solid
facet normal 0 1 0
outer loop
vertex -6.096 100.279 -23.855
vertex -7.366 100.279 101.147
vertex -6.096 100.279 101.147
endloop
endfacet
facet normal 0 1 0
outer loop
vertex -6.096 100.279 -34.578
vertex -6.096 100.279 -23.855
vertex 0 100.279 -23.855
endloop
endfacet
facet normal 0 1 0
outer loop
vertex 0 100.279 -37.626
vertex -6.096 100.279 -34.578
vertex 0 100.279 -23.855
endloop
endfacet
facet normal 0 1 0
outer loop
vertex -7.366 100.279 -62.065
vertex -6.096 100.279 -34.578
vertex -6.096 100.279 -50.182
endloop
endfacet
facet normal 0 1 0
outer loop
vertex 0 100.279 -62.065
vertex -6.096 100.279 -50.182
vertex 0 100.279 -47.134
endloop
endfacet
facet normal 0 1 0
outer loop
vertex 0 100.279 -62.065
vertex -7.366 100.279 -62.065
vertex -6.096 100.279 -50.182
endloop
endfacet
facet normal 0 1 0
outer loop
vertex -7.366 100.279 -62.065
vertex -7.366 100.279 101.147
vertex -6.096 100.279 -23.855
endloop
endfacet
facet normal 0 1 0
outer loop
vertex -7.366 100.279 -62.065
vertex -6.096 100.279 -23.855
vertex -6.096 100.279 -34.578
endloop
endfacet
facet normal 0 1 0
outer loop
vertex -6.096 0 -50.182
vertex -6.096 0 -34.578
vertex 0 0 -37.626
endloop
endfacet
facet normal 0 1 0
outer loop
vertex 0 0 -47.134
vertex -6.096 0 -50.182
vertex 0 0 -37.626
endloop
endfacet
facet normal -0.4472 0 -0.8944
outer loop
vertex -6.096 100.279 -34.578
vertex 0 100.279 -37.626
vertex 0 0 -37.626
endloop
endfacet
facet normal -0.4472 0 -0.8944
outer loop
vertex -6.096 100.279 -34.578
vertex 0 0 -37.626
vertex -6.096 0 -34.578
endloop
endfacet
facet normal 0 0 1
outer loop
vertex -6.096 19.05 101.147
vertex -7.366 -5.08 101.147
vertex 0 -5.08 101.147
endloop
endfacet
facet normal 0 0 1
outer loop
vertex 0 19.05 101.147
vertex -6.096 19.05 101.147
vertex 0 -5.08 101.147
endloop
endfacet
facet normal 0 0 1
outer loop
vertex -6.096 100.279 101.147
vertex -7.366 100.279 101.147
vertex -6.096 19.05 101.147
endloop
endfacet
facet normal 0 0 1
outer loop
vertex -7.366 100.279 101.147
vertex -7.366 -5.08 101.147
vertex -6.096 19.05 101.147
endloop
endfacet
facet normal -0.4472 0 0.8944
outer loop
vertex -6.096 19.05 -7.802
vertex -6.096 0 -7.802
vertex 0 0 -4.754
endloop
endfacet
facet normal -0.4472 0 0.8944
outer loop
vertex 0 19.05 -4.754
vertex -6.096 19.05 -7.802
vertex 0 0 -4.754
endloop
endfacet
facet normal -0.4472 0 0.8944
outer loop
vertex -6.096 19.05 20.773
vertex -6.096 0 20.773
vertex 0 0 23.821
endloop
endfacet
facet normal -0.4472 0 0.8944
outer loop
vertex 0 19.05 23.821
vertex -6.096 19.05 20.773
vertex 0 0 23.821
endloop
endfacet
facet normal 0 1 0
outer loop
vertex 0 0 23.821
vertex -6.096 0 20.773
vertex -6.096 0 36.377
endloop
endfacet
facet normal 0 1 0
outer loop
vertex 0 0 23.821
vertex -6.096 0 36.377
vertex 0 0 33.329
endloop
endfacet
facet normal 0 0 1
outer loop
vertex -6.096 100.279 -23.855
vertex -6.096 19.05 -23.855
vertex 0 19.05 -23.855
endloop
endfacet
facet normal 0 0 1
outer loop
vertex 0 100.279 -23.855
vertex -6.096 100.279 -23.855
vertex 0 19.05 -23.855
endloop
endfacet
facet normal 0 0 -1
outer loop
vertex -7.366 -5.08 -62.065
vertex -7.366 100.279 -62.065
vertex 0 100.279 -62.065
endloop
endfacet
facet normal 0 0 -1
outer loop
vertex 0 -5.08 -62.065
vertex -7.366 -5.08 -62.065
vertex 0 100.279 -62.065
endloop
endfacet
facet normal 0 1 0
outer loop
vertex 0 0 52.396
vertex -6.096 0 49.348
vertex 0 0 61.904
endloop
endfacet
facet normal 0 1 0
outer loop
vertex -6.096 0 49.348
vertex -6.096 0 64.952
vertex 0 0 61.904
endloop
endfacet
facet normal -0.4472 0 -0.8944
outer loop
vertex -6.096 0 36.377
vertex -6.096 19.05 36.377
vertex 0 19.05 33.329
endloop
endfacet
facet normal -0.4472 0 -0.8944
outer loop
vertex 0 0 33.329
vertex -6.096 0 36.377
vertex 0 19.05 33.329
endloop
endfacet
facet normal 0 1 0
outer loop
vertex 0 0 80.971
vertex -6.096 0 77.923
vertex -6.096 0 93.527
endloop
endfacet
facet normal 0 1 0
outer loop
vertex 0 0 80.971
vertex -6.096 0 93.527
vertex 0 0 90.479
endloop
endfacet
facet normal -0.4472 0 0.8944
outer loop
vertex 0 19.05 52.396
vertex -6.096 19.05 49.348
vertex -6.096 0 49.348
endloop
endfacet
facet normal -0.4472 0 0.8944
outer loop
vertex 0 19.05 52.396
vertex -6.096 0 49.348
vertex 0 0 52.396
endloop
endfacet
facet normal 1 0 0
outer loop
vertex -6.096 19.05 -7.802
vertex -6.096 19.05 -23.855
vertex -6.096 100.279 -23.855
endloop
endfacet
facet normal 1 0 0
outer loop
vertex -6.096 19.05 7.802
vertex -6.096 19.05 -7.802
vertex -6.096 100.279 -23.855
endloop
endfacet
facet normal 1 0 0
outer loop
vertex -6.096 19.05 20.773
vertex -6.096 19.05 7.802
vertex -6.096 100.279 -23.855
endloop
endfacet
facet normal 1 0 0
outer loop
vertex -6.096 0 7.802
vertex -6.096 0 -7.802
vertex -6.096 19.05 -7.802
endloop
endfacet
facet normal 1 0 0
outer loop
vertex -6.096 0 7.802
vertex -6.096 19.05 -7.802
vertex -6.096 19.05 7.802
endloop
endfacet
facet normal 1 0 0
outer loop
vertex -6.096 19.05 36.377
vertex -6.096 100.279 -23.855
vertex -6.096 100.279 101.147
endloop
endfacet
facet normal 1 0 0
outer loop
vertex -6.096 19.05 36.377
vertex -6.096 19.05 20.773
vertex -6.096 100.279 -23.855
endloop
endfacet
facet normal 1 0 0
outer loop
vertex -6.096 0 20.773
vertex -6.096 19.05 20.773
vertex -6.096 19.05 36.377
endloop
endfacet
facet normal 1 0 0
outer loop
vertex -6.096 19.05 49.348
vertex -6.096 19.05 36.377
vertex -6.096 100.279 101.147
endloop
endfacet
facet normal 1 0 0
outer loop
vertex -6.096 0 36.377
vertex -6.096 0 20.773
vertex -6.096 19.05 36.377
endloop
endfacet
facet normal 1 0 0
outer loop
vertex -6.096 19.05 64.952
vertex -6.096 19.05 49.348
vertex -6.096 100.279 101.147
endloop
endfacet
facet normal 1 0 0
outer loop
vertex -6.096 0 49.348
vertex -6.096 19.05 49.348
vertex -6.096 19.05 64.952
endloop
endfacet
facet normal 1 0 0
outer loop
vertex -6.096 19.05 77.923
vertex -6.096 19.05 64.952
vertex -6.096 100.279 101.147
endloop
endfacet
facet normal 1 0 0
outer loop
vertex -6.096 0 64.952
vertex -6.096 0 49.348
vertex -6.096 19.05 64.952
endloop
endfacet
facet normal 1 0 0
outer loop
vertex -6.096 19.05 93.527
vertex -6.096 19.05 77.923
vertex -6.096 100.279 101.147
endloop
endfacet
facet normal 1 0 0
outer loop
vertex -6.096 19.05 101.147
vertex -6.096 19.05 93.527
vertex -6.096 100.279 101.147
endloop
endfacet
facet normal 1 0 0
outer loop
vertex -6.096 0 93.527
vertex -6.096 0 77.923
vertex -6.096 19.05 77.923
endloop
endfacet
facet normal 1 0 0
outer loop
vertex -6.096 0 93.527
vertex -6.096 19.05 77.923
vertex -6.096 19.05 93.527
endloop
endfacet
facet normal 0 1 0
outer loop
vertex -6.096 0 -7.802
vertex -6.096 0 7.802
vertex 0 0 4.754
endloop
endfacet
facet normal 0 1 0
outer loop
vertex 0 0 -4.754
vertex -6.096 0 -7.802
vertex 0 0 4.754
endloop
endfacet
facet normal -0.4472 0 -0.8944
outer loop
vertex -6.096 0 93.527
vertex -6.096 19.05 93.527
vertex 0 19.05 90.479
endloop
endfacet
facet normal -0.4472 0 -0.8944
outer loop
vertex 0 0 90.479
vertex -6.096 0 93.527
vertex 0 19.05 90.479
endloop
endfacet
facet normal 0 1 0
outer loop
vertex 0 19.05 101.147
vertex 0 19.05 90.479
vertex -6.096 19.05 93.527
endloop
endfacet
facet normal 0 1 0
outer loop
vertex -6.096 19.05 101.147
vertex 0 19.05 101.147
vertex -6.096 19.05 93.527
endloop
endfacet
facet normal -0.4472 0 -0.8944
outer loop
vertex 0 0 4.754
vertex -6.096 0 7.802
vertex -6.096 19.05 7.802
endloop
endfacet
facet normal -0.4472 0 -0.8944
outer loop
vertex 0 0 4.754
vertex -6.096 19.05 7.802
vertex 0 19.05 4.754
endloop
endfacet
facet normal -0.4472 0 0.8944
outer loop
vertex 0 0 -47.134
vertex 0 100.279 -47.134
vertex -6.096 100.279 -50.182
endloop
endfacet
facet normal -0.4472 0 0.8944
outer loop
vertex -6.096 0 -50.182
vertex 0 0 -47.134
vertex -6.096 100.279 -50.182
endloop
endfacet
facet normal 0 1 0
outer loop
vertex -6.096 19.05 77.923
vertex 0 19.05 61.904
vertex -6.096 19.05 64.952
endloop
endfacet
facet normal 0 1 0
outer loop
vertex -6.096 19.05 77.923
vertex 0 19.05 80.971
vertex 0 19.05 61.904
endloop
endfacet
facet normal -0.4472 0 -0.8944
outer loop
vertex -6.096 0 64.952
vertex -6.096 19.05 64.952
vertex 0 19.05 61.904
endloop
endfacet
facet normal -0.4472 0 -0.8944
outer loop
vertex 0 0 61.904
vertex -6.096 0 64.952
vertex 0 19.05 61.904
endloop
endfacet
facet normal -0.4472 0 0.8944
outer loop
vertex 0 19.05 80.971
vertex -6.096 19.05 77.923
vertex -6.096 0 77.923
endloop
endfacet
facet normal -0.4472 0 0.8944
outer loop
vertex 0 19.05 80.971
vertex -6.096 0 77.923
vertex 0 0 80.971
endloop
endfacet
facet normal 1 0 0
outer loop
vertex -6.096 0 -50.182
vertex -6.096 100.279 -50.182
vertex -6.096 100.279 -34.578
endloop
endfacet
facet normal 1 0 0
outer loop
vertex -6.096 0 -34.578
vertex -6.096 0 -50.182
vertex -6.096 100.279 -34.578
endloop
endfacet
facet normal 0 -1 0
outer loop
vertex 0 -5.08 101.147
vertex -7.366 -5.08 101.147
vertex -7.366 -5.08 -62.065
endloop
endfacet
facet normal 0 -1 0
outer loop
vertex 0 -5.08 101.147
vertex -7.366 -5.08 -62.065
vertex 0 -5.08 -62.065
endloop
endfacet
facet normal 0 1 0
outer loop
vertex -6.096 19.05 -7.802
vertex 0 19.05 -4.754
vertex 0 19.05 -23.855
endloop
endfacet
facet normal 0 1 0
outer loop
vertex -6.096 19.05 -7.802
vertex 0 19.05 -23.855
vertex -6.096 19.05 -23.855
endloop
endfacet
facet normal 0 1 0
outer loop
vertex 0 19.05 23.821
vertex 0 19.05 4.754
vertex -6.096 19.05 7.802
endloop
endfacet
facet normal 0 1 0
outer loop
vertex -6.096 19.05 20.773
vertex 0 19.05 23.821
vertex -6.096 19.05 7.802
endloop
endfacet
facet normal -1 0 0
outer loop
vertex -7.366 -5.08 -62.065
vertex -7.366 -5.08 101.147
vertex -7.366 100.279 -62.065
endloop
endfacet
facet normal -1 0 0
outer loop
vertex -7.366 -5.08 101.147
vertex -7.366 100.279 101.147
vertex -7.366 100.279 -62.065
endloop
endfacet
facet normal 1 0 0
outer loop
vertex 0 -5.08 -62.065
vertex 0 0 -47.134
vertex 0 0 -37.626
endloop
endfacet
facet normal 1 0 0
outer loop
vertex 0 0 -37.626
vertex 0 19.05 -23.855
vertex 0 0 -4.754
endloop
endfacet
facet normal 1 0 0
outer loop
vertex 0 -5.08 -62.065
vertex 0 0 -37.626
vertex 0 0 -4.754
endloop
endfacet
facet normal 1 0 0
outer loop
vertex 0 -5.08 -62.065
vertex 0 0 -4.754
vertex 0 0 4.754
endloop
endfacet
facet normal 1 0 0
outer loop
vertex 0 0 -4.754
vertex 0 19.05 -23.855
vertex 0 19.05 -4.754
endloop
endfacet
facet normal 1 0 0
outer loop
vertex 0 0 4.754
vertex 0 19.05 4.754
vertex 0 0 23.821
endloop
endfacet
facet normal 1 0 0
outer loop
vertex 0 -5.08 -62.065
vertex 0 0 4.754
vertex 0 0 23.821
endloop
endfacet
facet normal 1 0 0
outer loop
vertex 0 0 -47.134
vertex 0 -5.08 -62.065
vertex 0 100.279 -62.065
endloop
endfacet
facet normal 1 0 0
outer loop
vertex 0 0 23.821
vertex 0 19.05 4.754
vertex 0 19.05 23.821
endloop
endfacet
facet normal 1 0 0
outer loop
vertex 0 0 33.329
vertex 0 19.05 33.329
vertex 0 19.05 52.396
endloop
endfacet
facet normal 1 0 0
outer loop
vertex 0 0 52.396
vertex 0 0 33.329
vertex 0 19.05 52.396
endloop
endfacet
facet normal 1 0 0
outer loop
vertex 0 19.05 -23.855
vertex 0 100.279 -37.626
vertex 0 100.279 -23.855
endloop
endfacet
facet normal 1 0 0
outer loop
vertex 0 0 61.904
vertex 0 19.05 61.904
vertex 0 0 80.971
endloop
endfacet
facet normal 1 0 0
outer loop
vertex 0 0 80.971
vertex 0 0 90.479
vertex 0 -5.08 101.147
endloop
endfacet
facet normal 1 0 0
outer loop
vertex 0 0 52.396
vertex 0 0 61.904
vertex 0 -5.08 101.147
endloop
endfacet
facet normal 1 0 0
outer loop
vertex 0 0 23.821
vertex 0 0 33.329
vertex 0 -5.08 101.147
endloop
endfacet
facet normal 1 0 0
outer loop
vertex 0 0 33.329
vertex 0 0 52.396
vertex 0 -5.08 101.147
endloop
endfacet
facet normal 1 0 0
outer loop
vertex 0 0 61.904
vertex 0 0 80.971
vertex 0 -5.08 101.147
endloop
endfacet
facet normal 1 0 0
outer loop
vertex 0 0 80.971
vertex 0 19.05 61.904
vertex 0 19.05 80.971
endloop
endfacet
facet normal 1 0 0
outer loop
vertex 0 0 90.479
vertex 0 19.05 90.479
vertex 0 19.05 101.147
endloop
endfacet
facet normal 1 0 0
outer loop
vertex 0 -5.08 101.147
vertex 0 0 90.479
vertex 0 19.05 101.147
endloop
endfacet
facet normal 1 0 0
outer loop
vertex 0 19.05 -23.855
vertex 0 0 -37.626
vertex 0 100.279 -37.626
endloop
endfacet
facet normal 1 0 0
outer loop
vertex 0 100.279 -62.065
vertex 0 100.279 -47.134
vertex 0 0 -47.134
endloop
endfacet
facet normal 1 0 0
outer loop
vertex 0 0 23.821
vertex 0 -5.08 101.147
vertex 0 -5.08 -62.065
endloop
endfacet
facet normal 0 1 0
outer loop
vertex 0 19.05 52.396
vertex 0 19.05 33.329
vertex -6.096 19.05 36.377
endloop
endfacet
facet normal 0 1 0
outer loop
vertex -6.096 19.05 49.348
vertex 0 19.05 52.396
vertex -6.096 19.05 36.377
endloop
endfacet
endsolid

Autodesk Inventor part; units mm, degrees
ref_plane "YZ Plane" through (0, 0, 0) normal (1, 0, 0) x (0, 1, 0)
ref_plane "XZ Plane" through (0, 0, 0) normal (0, 1, 0) x (-1, 0, 0)
ref_plane "XY Plane" through (0, 0, 0) normal (0, 0, 1) x (1, 0, 0)
sketch "Sketch1" plane through (0, 0, 0) normal (0, 1, 0) x (-1, 0, 0)
  line L0 (7.366, 0.1452) -> (7.366, -23.8548)
  line L1 (7.366, -23.8548) -> (0, -23.8548)
  line L2 (6.096, 4.754) -> (6.096, -4.754)
  line L3 (0, 4.754) -> (0, 7.802)
  line L4 (6.096, 7.802) -> (6.096, 4.754)
  line L5 (0, -4.754) -> (0, -7.548)
  line L6 (6.096, -7.802) -> (6.096, -4.754)
  line L7 (6.096, 7.802) -> (0, 4.754)
  line L8 (6.096, -7.802) -> (0, -4.754)
  line L9 (0, -23.8548) -> (0, -4.754)
  line L10 (0, 4.754) -> (0, 23.821)
  line L11 (6.096, 20.773) -> (6.096, 23.821)
  line L12 (6.096, 20.773) -> (0, 23.821)
  line L13 (6.096, 36.377) -> (6.096, 33.329)
  line L14 (6.096, 36.377) -> (0, 33.329)
  line L15 (6.096, 33.329) -> (6.096, 23.821)
  line L16 (6.096, 49.348) -> (6.096, 52.396)
  line L17 (6.096, 49.348) -> (0, 52.396)
  line L18 (6.096, 64.952) -> (6.096, 61.904)
  line L19 (6.096, 64.952) -> (0, 61.904)
  line L20 (6.096, 61.904) -> (6.096, 52.396)
  line L21 (6.096, 77.923) -> (6.096, 80.971)
  line L22 (6.096, 77.923) -> (0, 80.971)
  line L23 (6.096, 93.527) -> (6.096, 90.479)
  line L24 (6.096, 93.527) -> (0, 90.479)
  line L25 (6.096, 90.479) -> (6.096, 80.971)
  line L26 (7.366, 0.1452) -> (7.366, 101.147)
  line L27 (7.366, 101.147) -> (0, 101.147)
  line L28 (0, 33.329) -> (0, 52.396)
  line L29 (0, 61.904) -> (0, 80.971)
  line L30 (0, 90.479) -> (0, 101.147)
  point P0 (0, 0)
  dimension "d0" = 7.366
  dimension "d1" = 24
  dimension "d8" = 9.508
  dimension "d9" = 4.754
  dimension "d10" = 3.048
  dimension "d11" = 3.048
  dimension "d12" = 6.096
  dimension "d17" = 28.575
  dimension "d23" = 7.62
  dimension "d24" = 16.0528
  dimension "d31" = 125.0018
extrude "MultipleTeeth" add sketch "Sketch1" along normal blind 19.05
sketch "Sketch2" plane through (0, 0, 0) normal (0, -1, 0) x (1, 0, 0)
  line L0 (0, 4.754) -> (-6.096, 7.802) construction
  line L1 (-6.096, 7.802) -> (-6.096, -7.802) construction
  line L2 (-6.096, -7.802) -> (0, -4.754) construction
  line L3 (0, 23.821) -> (0, 4.754) projected
  line L4 (0, 4.754) -> (-6.096, 7.802)
  line L5 (-6.096, -7.802) -> (0, -4.754) projected
  line L6 (-6.096, 7.802) -> (-6.096, -7.802) projected
  line L7 (-6.096, -7.802) -> (-6.096, 7.802)
  line L8 (0, -4.754) -> (-6.096, -7.802)
  line L9 (-7.366, -23.8548) -> (-7.366, 101.147) projected
  line L10 (-7.366, -59.508) -> (-7.366, -32.8548)
  line L11 (-7.366, -23.8548) -> (0, -23.8548)
  line L12 (-7.366, 101.147) -> (0, 101.147) projected
  line L13 (-7.366, -55.8503) -> (-7.366, -40.458) construction
  line L14 (0, -43.0234) -> (0, -59.508) construction
  line L15 (-6.096, -62.0648) -> (0, -62.0648) construction
  line L16 (0, -32.8548) -> (0, -37.6258)
  line L17 (0, -49.9828) -> (0, -62.0648)
  line L18 (0, -62.0648) -> (0, -59.508)
  line L19 (0, -32.8548) -> (-7.366, -32.8548) construction
  line L20 (0, -51.9048) -> (-7.366, -51.9048) construction
  line L21 (0, -42.3798) -> (-7.366, -42.3798) construction
  line L22 (-6.096, -7.802) -> (-6.096, -62.0648) construction
  line L23 (0, -37.6258) -> (-6.096, -34.5778)
  line L24 (-6.096, -50.1818) -> (-6.096, -34.5778)
  line L25 (0, -47.1338) -> (-6.096, -50.1818)
  line L26 (0, -4.754) -> (0, -23.8548) projected
  line L27 (0, -23.8548) -> (0, -32.8548)
  line L28 (-7.366, -32.8548) -> (-7.366, -23.8548)
  line L29 (0, -49.9828) -> (0, -47.1338)
  line L30 (0, -62.0648) -> (-7.366, -62.0648)
  line L31 (-7.366, -62.0648) -> (-7.366, -59.508)
  point P0 (0, 0)
  dimension "d25" = 125.0018
  dimension "d33" = 9
  dimension "d34" = 19.05
  dimension "d36" = 9.525
  dimension "d38" = 10.16
extrude "LongTooth" add sketch "Sketch2" against normal blind 100.2792
sketch "Sketch3" plane through (0, 19.05, 0) normal (0, 1, 0) x (1, 0, 0)
  line L0 (-6.096, -7.802) -> (-6.096, 7.802) construction
  line L1 (0, 23.8548) -> (-7.366, 23.8548) projected
  line L2 (-7.366, -101.147) -> (0, -101.147) projected
  line L3 (-7.366, 23.8548) -> (-6.096, 23.8548)
  line L4 (-6.096, 23.8548) -> (-6.096, -101.147)
  line L5 (-6.096, -101.147) -> (-7.366, -101.147)
  line L6 (-7.366, -101.147) -> (-7.366, 23.8548)
  point P0 (0, 0)
extrude "ThinPlate" add sketch "Sketch3" along normal up to surface (81.2292 mm away)
sketch "Sketch4" plane through (0, 0, 0) normal (0, -1, 0) x (1, 0, 0)
  line L0 (-6.096, 101.147) -> (0, 101.147) projected
  line L1 (-7.366, 101.147) -> (-7.366, -62.0648) projected
  line L2 (0, 101.147) -> (-7.366, 101.147)
  line L3 (-7.366, 101.147) -> (-7.366, -62.0648)
  line L4 (-7.366, -62.0648) -> (0, -62.0648)
  line L5 (0, -62.0648) -> (0, 101.147)
  point P0 (0, 0)
extrude "Extrusion4" add sketch "Sketch4" along normal blind 5.08
equation "\"d9\" = 0.5 * d8"
equation "\"d11\" = d10"
equation "\"d36\" = 0.5 * d34"
properties part number "Sliding test receiver copy"
